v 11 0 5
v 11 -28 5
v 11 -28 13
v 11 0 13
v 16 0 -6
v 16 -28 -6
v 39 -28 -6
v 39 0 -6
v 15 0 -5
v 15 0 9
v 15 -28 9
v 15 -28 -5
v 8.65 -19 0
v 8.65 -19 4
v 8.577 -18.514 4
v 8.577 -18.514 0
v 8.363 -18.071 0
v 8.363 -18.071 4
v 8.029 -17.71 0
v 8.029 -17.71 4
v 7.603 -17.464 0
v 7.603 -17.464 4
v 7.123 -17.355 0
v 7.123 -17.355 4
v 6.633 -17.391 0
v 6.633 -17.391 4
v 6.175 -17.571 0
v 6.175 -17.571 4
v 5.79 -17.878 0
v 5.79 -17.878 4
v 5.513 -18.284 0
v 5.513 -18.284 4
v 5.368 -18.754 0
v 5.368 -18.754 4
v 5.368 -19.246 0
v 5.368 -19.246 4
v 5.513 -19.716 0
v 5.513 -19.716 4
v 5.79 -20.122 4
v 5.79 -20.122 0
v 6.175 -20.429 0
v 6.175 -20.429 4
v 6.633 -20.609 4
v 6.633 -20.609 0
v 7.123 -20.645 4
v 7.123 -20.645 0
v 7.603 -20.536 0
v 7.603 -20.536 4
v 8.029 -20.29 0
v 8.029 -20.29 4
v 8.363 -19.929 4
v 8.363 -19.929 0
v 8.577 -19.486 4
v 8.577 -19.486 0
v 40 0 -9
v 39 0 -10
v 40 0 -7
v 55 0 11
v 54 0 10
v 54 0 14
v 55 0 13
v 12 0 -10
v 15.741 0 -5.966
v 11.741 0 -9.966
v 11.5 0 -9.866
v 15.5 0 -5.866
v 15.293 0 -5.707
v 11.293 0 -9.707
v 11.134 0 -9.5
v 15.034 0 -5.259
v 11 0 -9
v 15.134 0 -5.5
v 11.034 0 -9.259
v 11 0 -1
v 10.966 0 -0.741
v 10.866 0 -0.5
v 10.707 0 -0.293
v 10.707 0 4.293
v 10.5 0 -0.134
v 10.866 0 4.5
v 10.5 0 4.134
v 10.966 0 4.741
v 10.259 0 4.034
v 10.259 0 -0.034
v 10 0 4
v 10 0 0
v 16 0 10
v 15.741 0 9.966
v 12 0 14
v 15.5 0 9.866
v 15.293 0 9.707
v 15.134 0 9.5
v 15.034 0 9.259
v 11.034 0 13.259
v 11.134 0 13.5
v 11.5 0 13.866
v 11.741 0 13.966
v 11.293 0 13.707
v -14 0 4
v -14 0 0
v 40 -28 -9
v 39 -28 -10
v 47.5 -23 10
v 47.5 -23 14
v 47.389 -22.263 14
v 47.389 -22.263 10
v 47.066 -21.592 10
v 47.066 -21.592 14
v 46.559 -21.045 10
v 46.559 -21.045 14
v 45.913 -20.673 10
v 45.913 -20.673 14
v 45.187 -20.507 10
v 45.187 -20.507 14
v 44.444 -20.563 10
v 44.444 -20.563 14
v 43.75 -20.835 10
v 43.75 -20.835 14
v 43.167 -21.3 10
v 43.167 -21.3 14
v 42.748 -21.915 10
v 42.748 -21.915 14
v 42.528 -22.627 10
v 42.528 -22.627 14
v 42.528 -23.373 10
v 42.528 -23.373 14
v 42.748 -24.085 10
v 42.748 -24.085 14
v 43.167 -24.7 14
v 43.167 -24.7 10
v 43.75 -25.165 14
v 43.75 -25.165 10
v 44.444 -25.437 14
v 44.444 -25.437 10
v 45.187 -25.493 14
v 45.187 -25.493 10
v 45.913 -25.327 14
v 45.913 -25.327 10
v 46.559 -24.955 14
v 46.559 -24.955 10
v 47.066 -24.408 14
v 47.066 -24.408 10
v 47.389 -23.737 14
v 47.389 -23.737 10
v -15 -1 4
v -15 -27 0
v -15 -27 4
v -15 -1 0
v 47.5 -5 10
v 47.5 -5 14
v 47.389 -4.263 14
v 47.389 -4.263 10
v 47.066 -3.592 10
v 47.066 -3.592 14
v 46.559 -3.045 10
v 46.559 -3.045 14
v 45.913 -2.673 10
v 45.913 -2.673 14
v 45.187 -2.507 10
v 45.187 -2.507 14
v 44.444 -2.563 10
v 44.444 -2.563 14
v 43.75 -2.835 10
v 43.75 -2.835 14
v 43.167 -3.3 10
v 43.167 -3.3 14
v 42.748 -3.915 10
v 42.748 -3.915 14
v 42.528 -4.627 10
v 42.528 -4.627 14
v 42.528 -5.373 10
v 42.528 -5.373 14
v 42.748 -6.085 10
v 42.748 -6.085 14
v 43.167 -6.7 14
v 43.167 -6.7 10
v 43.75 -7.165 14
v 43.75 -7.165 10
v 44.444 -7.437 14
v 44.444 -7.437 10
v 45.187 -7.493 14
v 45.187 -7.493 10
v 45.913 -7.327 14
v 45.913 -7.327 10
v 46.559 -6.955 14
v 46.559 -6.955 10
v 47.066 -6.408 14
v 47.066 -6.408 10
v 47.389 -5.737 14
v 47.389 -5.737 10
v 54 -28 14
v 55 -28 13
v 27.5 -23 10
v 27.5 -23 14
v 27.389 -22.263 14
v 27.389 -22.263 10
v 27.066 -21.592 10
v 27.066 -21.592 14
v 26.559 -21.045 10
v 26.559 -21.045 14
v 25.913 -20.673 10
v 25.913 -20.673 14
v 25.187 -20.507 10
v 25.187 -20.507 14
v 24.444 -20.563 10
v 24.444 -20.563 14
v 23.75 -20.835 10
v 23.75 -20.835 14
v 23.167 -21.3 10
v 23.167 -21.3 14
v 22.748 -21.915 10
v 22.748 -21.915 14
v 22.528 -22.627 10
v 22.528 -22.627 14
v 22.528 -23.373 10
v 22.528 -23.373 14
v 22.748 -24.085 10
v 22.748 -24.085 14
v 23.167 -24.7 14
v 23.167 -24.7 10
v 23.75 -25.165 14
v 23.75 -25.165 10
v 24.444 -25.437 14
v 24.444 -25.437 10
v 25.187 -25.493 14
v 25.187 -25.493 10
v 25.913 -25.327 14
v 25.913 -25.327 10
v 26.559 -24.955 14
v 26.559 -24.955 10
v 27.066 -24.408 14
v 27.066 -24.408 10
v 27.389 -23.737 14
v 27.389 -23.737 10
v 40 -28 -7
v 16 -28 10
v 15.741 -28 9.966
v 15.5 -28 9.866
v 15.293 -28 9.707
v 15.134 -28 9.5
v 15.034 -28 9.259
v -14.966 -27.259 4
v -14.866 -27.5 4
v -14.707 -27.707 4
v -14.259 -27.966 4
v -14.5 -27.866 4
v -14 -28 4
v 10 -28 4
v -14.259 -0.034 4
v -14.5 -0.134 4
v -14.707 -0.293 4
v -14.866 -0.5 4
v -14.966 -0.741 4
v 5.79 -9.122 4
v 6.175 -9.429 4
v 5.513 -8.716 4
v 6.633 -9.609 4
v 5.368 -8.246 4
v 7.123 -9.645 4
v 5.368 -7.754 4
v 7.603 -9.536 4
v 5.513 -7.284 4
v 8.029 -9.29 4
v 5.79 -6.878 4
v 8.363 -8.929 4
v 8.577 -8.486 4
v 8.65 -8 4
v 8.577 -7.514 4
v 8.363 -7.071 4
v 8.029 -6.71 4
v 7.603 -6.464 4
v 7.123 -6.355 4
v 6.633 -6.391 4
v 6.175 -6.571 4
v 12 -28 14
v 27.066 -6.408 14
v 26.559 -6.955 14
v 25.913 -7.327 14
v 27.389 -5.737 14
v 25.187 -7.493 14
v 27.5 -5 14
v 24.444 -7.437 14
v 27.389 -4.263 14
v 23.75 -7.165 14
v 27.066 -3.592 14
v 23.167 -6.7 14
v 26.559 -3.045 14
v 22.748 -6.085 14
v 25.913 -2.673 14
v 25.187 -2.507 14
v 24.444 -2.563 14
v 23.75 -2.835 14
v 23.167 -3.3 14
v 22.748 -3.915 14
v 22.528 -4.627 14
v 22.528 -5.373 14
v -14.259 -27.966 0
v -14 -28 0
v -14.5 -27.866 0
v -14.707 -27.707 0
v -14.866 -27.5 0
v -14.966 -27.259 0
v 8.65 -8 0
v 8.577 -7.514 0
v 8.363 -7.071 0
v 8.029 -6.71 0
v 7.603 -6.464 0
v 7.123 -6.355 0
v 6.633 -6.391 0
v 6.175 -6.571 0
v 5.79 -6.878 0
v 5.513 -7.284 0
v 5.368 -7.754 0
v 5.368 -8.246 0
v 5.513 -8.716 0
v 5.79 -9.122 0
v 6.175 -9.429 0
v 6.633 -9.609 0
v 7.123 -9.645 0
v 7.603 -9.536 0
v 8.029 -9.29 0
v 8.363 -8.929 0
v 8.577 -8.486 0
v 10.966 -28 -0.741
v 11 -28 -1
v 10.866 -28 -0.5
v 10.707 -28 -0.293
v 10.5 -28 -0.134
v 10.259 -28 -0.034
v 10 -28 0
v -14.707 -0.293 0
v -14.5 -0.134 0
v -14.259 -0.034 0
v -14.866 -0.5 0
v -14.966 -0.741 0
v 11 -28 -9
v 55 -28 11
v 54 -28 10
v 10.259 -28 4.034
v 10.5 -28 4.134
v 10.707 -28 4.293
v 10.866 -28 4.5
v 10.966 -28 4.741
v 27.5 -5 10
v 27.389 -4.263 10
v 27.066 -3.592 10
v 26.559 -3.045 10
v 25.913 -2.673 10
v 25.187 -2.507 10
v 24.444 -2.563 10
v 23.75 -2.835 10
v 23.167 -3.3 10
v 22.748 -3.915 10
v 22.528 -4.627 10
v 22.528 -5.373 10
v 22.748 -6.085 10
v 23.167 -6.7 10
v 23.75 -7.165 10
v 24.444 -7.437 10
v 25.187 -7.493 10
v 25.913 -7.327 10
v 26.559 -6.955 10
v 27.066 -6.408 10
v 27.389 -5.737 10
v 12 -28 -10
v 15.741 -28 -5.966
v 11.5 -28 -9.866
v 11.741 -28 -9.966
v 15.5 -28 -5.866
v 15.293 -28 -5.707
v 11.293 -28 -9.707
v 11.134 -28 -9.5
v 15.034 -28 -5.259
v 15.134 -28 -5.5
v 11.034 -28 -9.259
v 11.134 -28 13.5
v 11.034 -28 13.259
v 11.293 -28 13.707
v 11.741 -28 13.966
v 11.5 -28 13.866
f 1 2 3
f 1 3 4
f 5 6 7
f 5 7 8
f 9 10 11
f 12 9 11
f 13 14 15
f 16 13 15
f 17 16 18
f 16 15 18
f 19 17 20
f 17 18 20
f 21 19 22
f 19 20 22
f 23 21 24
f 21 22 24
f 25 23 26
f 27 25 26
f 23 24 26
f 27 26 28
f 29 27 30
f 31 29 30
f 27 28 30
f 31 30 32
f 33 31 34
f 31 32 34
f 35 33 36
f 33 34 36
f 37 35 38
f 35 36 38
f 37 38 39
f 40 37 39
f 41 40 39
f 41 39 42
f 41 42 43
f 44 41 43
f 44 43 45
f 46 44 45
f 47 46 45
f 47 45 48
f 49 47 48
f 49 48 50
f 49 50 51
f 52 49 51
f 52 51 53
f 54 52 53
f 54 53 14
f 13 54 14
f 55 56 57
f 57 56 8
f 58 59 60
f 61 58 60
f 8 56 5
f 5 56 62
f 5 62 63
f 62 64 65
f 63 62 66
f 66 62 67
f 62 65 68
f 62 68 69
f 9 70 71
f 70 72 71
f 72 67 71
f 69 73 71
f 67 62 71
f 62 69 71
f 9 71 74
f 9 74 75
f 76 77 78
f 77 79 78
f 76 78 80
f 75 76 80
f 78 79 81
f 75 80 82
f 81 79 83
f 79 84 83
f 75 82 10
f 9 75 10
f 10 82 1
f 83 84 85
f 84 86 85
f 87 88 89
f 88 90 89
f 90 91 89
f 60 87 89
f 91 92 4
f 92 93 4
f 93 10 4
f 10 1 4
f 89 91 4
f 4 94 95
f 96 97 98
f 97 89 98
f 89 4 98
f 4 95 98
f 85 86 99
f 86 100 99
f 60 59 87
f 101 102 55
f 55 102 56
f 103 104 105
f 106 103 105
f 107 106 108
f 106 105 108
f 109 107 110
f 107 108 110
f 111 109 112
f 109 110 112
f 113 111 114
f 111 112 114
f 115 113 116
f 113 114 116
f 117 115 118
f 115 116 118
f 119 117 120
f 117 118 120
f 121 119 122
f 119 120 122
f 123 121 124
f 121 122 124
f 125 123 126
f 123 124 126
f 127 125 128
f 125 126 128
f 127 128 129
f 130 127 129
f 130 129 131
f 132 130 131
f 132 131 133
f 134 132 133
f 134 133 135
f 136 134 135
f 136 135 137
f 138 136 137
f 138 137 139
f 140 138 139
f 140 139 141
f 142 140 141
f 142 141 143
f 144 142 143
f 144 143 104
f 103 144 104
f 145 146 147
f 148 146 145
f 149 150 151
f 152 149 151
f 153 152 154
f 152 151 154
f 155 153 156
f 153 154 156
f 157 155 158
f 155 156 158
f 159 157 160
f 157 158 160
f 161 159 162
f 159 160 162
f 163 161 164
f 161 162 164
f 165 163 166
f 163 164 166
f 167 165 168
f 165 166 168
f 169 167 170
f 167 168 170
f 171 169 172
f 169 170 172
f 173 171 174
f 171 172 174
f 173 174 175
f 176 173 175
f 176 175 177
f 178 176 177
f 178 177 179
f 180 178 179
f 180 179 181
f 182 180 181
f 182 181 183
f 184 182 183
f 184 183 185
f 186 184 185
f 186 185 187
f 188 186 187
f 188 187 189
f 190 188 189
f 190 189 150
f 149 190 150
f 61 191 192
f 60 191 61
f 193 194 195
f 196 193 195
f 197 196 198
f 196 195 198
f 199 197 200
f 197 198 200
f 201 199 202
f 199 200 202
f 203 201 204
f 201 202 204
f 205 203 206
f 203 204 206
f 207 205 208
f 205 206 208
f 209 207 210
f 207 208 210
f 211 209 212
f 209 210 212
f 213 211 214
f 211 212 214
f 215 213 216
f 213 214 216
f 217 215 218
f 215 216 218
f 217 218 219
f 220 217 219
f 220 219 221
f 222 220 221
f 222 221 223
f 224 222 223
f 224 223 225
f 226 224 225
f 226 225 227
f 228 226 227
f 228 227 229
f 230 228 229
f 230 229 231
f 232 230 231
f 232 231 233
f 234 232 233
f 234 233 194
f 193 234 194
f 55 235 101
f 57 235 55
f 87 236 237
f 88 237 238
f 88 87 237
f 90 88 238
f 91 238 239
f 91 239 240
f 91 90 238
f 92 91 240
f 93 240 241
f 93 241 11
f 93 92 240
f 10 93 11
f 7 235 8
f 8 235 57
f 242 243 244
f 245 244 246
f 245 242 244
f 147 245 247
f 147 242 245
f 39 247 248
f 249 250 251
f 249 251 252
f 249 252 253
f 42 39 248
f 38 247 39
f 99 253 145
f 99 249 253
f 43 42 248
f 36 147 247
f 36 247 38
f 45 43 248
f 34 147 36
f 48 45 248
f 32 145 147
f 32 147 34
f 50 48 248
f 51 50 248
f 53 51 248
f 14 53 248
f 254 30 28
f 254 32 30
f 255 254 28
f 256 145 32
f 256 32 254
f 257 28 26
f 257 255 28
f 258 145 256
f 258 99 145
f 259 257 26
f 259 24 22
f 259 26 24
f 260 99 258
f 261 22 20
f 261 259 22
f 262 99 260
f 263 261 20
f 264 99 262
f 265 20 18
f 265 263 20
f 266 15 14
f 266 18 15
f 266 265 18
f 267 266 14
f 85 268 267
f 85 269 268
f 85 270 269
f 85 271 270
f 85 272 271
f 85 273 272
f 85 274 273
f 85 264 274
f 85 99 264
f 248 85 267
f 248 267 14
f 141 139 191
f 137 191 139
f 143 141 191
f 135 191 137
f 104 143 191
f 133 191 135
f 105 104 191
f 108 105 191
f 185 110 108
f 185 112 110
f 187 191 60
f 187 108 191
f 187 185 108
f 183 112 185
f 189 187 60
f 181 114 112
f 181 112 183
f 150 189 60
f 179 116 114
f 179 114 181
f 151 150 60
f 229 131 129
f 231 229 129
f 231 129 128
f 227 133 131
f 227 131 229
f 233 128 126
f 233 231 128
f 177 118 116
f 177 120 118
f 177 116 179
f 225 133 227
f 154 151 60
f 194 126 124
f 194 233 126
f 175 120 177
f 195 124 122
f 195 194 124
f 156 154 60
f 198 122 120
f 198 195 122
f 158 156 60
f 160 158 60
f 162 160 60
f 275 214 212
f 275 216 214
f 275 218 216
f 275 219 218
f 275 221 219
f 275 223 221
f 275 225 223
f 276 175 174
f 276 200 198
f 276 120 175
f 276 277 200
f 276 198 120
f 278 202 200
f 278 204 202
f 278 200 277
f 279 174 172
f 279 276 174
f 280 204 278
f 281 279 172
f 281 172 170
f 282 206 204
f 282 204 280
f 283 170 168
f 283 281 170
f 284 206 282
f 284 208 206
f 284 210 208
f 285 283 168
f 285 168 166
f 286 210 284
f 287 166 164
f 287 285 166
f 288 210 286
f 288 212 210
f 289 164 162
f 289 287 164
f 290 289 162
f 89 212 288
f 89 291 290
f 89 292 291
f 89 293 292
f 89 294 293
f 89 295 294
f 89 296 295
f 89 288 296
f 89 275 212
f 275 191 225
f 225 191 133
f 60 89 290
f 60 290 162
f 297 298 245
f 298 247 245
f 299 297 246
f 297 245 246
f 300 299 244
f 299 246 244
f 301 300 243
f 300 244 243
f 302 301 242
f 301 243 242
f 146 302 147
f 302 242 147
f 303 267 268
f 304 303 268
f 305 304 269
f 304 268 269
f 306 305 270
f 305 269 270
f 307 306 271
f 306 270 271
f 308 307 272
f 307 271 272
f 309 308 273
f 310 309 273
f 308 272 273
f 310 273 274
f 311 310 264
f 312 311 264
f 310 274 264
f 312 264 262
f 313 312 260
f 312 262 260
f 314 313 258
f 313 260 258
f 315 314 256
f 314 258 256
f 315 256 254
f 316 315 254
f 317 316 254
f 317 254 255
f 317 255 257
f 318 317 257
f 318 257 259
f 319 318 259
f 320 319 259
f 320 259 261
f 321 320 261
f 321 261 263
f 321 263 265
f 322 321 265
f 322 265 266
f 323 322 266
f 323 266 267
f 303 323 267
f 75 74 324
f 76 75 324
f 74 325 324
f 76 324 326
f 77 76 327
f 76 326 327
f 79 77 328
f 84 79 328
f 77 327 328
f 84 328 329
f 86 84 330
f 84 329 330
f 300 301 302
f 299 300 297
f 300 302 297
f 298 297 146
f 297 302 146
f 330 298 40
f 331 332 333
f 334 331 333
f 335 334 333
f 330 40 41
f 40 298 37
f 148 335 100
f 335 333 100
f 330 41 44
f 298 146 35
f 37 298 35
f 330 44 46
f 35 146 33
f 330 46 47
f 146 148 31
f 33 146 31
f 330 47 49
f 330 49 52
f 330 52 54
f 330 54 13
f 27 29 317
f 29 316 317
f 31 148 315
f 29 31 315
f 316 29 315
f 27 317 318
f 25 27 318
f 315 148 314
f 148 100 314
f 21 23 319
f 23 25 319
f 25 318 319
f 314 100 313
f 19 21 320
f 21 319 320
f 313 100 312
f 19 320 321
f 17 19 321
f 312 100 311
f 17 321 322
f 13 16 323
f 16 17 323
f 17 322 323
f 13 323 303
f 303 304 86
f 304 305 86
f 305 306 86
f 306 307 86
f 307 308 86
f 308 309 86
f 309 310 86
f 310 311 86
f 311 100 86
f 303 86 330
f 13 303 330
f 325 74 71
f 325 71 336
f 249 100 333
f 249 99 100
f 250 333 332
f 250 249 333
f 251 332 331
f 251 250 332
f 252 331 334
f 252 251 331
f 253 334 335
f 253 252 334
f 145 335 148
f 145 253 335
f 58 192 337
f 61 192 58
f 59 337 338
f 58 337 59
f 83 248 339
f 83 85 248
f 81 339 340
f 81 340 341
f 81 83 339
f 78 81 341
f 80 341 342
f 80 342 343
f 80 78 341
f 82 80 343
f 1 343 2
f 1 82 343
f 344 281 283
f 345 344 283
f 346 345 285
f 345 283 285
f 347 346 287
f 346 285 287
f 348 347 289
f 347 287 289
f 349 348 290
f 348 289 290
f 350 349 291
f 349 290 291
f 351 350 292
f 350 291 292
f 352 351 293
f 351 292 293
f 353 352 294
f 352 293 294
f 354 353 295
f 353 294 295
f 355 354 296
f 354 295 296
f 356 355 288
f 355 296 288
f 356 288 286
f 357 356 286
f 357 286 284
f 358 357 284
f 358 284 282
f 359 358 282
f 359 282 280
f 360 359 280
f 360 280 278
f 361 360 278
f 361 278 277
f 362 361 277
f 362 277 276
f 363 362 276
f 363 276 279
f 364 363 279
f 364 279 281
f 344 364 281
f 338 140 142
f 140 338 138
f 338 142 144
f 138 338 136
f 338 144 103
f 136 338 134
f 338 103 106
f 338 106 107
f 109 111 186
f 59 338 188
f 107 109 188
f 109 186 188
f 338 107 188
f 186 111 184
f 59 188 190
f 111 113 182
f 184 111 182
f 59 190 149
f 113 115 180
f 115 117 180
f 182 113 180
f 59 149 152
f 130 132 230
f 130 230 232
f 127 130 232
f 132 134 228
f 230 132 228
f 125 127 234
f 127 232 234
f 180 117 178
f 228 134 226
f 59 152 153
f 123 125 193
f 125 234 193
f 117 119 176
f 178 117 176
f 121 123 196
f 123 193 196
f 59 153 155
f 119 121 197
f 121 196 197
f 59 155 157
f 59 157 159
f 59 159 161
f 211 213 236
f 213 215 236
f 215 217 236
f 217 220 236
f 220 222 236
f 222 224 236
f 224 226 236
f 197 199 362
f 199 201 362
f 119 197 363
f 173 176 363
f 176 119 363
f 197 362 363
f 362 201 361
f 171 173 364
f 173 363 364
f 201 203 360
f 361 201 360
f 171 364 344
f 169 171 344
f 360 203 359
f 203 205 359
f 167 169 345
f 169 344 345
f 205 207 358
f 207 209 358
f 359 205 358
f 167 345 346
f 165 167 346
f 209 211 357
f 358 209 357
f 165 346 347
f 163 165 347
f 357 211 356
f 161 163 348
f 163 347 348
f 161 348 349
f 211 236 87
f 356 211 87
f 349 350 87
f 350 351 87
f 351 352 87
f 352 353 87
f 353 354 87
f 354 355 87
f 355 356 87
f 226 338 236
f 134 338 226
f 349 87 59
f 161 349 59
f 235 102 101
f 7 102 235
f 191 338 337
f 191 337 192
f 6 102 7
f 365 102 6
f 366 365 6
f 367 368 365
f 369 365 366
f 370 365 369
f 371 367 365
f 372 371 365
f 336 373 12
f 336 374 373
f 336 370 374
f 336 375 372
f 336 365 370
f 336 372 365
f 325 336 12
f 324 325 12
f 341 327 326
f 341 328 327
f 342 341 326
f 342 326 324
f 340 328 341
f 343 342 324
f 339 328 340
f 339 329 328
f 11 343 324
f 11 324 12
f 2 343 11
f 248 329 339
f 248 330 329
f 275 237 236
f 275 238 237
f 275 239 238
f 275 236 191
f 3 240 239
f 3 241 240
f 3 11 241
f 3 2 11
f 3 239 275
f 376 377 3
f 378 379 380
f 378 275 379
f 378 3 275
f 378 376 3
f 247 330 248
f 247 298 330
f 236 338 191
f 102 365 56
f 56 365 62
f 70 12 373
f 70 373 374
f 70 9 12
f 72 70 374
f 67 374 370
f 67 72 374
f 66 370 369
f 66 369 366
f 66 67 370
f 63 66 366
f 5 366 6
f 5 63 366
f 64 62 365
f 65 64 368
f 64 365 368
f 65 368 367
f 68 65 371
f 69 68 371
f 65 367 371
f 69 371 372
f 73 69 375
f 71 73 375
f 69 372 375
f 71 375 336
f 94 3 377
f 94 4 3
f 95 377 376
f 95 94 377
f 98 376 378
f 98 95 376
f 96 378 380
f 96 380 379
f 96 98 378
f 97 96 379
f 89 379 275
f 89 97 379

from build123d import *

# Parameters (mm, degrees)
SKETCH_W        = 30
SKETCH_H        = 28
PAD_DEPTH       = 4
SKETCH001_W     = 4
SKETCH001_H     = 28
PAD001_DEPTH    = 6
PAD001_FACE5_W  = 28
PAD001_FACE5_H  = 4
PAD002_DEPTH    = 4
SKETCH002_W     = 28
SKETCH002_H     = 4
PAD003_DEPTH    = 40
SKETCH003_R     = 2.5
POCKET_DEPTH    = 5
SKETCH004_R     = 1.65
POCKET001_DEPTH = 5
SKETCH005_W     = 4
SKETCH005_H     = 28
PAD004_DEPTH    = 10
SKETCH006_W     = 28
SKETCH006_H     = 4
PAD005_DEPTH    = 25
FILLET_R        = 1
CHAMFER_SIZE    = 1


with BuildPart() as part:
    # Sketch → Pad (new body)
    with BuildSketch(Plane.XY):
        with Locations((0, -14)):
            Rectangle(SKETCH_W, SKETCH_H)
    extrude(amount=PAD_DEPTH)

    # Sketch001 (on Face6 of Pad) → Pad001 (join)
    with BuildSketch(Plane.XY.offset(4)):
        with Locations((13, -14)):
            Rectangle(SKETCH001_W, SKETCH001_H)
    extrude(amount=PAD001_DEPTH)

    # Pad001 Face5 → Pad002 (add)
    with BuildSketch(Plane(origin=(13, -14, 10), x_dir=(0, 1, 0), z_dir=(0, 0, 1))):
        Rectangle(PAD001_FACE5_W, PAD001_FACE5_H)
    extrude(amount=PAD002_DEPTH)

    # Sketch002 (on Face8 of Pad002) → Pad003 (join)
    with BuildSketch(Plane.YZ.offset(15)):
        with Locations((-14, 12)):
            Rectangle(SKETCH002_W, SKETCH002_H)
    extrude(amount=PAD003_DEPTH)

    # Sketch003 (on Face10 of Pad003) → Pocket (cut)
    with BuildSketch(Plane.XY.offset(14)):
        with Locations((25, -5)):
            Circle(SKETCH003_R)
        with Locations((25, -23)):
            Circle(SKETCH003_R)
        with Locations((45, -5)):
            Circle(SKETCH003_R)
        with Locations((45, -23)):
            Circle(SKETCH003_R)
    extrude(amount=-POCKET_DEPTH, mode=Mode.SUBTRACT)

    # Sketch004 (on Face5 of Pocket) → Pocket001 (cut)
    with BuildSketch(Plane.XY.offset(4)):
        with Locations((7, -8)):
            Circle(SKETCH004_R)
        with Locations((7, -19)):
            Circle(SKETCH004_R)
    extrude(amount=-POCKET001_DEPTH, mode=Mode.SUBTRACT)

    # Sketch005 (on Face4 of Pocket001) → Pad004 (join)
    with BuildSketch(Plane(origin=(0, 0, 0), x_dir=(1, 0, 0), z_dir=(0, 0, -1))):
        with Locations((13, 14)):
            Rectangle(SKETCH005_W, SKETCH005_H)
    extrude(amount=PAD004_DEPTH)

    # Sketch006 (on Face18 of Pad004) → Pad005 (join)
    with BuildSketch(Plane.YZ.offset(15)):
        with Locations((-14, -8)):
            Rectangle(SKETCH006_W, SKETCH006_H)
    extrude(amount=PAD005_DEPTH)

    # Fillet
    fillet_edges = [part.edges().sort_by_distance(p)[0] for p in [
        (15, -14, 10),
        (15, -14, -6),
        (11, -14, 4),
        (11, -14, 0),
        (-15, 0, 2),
        (-15, -28, 2),
        (11, -14, 14),
        (11, -14, -10),
    ]]
    fillet(fillet_edges, radius=FILLET_R)

    # Chamfer
    chamfer_edges = [part.edges().sort_by_distance(p)[0] for p in [
        (40, -14, -6),
        (55, -14, 10),
        (40, -14, -10),
        (55, -14, 14),
    ]]
    chamfer(chamfer_edges, length=CHAMFER_SIZE)


solid = part.part
